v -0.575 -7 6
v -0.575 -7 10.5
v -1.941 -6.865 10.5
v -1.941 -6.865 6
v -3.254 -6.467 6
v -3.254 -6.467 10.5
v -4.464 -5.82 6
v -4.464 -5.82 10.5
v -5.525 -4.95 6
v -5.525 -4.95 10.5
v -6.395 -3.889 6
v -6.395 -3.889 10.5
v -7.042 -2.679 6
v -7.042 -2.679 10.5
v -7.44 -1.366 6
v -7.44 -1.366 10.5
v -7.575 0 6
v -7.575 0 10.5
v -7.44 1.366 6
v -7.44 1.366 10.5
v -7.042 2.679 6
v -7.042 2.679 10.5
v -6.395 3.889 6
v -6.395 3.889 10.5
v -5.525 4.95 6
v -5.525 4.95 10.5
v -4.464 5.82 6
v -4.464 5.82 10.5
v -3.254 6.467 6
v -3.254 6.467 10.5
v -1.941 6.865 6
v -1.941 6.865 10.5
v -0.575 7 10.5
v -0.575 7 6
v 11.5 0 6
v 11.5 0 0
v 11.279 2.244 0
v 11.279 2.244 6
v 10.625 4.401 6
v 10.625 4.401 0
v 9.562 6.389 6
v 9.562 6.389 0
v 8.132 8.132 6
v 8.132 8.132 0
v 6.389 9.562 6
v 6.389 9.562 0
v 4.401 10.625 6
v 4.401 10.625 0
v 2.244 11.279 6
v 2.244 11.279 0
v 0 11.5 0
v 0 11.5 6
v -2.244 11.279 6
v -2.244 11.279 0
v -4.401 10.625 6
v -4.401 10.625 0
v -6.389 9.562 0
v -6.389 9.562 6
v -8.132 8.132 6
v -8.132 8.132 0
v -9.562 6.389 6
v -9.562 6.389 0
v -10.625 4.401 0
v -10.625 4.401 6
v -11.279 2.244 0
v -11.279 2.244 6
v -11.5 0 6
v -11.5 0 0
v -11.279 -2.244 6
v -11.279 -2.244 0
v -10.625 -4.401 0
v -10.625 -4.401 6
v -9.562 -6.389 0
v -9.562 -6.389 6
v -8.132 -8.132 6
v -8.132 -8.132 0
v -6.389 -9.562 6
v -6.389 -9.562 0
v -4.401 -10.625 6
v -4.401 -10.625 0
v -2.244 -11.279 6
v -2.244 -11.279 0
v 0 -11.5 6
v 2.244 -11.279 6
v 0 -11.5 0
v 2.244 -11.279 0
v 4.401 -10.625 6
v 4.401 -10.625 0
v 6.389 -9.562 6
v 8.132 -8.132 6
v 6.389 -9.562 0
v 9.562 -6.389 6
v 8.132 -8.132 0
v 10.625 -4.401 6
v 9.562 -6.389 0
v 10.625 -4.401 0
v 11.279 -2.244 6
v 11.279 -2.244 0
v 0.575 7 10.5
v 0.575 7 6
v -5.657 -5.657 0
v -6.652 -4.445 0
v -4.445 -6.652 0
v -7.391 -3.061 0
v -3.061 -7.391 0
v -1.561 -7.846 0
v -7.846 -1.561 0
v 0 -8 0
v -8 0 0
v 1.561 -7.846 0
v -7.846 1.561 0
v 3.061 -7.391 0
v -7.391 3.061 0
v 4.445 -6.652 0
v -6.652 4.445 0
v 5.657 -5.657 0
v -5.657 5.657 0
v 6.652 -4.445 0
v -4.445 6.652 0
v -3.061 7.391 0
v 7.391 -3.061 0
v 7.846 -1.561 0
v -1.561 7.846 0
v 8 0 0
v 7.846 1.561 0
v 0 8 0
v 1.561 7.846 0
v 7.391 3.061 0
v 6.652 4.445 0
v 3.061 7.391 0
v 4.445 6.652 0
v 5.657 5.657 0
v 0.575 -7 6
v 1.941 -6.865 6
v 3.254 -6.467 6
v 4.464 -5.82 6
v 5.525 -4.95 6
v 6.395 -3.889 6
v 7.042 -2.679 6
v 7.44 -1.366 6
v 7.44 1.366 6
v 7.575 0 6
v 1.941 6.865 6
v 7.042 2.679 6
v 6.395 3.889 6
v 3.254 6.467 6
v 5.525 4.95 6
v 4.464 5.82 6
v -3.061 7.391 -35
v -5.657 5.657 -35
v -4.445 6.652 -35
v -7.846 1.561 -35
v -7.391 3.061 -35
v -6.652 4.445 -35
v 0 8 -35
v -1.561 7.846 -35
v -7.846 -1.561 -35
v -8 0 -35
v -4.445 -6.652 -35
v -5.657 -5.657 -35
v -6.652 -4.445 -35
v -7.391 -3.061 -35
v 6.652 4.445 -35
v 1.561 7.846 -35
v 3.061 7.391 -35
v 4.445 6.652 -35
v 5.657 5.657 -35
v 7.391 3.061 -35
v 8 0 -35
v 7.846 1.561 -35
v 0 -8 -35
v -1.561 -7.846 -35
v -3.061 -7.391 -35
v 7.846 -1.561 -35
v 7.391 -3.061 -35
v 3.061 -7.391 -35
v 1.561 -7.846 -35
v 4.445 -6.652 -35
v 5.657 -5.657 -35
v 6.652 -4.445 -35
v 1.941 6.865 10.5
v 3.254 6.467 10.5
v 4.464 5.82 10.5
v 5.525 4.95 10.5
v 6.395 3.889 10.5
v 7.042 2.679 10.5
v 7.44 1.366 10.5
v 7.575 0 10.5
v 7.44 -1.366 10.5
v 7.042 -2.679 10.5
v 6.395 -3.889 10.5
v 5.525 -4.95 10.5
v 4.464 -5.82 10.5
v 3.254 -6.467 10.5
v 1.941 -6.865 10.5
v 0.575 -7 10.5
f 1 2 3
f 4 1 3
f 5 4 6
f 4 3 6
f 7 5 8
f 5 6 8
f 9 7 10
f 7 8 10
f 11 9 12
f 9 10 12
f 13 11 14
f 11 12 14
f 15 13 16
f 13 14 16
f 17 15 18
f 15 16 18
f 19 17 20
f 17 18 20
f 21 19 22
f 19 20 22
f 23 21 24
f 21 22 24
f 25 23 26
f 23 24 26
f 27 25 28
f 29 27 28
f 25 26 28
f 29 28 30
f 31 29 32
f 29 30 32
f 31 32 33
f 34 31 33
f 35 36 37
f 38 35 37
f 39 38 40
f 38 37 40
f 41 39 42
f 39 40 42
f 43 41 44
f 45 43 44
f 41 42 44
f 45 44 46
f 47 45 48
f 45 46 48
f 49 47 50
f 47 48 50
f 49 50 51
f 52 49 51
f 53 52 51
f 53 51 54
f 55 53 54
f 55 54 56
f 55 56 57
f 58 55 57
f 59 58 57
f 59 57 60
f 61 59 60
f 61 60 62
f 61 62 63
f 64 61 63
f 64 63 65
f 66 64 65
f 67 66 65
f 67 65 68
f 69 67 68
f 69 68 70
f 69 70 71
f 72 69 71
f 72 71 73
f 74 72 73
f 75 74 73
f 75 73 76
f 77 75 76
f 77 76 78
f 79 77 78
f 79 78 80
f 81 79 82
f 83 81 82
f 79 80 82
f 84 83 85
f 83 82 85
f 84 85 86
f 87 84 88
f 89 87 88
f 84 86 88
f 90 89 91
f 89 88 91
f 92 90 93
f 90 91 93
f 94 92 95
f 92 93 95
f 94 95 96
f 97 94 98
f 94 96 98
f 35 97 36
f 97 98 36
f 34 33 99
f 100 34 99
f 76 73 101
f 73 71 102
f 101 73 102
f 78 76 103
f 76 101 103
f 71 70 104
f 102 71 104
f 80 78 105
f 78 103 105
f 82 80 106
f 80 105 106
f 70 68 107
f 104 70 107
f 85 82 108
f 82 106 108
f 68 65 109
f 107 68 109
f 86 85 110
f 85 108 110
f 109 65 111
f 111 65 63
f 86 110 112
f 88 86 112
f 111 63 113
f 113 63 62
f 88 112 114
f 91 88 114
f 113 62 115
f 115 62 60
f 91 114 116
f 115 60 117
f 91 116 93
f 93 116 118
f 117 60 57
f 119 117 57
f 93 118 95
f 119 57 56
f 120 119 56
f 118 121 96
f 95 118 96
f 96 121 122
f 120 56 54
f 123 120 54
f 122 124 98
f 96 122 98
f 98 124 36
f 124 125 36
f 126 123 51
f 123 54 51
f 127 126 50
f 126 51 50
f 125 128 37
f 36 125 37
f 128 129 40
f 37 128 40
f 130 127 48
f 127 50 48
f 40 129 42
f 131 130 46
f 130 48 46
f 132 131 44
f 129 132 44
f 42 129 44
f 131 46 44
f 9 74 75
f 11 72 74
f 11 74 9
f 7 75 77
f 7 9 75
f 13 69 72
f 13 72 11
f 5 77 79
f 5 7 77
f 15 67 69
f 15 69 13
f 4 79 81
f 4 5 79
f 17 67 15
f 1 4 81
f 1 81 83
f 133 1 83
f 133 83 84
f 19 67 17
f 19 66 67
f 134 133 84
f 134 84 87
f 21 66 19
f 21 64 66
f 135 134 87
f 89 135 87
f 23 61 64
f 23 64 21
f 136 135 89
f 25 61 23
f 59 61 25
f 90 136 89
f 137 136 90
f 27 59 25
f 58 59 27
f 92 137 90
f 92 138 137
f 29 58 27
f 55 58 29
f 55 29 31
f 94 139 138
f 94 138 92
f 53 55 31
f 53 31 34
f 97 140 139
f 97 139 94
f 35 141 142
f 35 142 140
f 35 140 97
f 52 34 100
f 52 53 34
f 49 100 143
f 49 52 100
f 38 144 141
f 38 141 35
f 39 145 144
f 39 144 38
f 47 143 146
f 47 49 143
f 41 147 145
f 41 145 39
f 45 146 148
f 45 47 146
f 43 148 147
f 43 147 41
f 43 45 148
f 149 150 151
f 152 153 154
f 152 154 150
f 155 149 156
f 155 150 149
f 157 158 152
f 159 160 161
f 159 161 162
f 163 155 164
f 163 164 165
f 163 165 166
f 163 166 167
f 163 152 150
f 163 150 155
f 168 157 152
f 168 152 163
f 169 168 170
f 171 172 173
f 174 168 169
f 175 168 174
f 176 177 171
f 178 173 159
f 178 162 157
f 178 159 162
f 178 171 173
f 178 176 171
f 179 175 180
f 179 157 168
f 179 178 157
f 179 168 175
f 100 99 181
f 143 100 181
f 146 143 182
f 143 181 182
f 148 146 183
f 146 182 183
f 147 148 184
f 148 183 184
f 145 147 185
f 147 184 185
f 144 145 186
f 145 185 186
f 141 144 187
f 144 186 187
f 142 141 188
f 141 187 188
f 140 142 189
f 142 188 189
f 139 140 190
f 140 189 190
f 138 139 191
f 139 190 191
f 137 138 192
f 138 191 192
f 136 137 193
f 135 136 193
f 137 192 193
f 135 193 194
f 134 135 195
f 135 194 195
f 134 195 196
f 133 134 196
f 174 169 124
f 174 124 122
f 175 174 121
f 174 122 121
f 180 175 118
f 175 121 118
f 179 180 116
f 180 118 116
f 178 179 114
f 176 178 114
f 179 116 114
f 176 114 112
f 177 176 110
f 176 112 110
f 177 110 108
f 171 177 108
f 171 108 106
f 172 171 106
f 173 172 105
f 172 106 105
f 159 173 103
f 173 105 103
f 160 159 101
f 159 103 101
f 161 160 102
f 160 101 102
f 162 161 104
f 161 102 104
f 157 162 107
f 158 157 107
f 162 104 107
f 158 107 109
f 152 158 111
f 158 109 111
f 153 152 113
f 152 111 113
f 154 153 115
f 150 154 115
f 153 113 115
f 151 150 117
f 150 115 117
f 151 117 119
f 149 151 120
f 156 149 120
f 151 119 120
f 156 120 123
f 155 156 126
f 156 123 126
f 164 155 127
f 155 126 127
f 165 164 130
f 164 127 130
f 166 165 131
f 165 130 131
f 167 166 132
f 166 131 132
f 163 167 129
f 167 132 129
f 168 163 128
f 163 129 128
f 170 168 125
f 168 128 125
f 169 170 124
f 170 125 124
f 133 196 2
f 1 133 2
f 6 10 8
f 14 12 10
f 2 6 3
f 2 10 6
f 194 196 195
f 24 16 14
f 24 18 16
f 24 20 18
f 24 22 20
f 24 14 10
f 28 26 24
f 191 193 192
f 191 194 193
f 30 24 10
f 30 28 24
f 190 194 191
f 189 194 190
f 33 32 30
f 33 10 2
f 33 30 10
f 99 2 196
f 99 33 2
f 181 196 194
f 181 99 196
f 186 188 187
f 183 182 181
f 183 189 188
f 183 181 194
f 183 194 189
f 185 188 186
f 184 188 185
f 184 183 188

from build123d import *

# Parameters (mm, degrees)
F0_R     = 11.5
F1_DEPTH = 10.5
F2_R     = 8
F3_DEPTH = 35
F4_R     = 11.5
F5_DEPTH = 4.5


with BuildPart() as f1:
    # F0 (on Top) → F1 (new body)
    with BuildSketch(Plane.XY):
        Circle(F0_R)
    extrude(amount=F1_DEPTH)

    # F2 (on face) → F3 (join)
    with BuildSketch(Plane(origin=(0, 0, 0), x_dir=(1, 0, 0), z_dir=(0, 0, -1))):
        Circle(F2_R)
    extrude(amount=F3_DEPTH)

    # F4 (on face) → F5 (cut)
    with BuildSketch(Plane.XY.offset(10.5)):
        Circle(F4_R)
        with BuildLine():
            ThreePointArc((0.575, 7), (7.575, 0), (0.575, -7))
            Line((0.575, -7), (-0.575, -7))
            ThreePointArc((-0.575, -7), (-7.575, 0), (-0.575, 7))
            Line((-0.575, 7), (0.575, 7))
        make_face(mode=Mode.SUBTRACT)
    extrude(amount=-F5_DEPTH, mode=Mode.SUBTRACT)


solid = f1.part
